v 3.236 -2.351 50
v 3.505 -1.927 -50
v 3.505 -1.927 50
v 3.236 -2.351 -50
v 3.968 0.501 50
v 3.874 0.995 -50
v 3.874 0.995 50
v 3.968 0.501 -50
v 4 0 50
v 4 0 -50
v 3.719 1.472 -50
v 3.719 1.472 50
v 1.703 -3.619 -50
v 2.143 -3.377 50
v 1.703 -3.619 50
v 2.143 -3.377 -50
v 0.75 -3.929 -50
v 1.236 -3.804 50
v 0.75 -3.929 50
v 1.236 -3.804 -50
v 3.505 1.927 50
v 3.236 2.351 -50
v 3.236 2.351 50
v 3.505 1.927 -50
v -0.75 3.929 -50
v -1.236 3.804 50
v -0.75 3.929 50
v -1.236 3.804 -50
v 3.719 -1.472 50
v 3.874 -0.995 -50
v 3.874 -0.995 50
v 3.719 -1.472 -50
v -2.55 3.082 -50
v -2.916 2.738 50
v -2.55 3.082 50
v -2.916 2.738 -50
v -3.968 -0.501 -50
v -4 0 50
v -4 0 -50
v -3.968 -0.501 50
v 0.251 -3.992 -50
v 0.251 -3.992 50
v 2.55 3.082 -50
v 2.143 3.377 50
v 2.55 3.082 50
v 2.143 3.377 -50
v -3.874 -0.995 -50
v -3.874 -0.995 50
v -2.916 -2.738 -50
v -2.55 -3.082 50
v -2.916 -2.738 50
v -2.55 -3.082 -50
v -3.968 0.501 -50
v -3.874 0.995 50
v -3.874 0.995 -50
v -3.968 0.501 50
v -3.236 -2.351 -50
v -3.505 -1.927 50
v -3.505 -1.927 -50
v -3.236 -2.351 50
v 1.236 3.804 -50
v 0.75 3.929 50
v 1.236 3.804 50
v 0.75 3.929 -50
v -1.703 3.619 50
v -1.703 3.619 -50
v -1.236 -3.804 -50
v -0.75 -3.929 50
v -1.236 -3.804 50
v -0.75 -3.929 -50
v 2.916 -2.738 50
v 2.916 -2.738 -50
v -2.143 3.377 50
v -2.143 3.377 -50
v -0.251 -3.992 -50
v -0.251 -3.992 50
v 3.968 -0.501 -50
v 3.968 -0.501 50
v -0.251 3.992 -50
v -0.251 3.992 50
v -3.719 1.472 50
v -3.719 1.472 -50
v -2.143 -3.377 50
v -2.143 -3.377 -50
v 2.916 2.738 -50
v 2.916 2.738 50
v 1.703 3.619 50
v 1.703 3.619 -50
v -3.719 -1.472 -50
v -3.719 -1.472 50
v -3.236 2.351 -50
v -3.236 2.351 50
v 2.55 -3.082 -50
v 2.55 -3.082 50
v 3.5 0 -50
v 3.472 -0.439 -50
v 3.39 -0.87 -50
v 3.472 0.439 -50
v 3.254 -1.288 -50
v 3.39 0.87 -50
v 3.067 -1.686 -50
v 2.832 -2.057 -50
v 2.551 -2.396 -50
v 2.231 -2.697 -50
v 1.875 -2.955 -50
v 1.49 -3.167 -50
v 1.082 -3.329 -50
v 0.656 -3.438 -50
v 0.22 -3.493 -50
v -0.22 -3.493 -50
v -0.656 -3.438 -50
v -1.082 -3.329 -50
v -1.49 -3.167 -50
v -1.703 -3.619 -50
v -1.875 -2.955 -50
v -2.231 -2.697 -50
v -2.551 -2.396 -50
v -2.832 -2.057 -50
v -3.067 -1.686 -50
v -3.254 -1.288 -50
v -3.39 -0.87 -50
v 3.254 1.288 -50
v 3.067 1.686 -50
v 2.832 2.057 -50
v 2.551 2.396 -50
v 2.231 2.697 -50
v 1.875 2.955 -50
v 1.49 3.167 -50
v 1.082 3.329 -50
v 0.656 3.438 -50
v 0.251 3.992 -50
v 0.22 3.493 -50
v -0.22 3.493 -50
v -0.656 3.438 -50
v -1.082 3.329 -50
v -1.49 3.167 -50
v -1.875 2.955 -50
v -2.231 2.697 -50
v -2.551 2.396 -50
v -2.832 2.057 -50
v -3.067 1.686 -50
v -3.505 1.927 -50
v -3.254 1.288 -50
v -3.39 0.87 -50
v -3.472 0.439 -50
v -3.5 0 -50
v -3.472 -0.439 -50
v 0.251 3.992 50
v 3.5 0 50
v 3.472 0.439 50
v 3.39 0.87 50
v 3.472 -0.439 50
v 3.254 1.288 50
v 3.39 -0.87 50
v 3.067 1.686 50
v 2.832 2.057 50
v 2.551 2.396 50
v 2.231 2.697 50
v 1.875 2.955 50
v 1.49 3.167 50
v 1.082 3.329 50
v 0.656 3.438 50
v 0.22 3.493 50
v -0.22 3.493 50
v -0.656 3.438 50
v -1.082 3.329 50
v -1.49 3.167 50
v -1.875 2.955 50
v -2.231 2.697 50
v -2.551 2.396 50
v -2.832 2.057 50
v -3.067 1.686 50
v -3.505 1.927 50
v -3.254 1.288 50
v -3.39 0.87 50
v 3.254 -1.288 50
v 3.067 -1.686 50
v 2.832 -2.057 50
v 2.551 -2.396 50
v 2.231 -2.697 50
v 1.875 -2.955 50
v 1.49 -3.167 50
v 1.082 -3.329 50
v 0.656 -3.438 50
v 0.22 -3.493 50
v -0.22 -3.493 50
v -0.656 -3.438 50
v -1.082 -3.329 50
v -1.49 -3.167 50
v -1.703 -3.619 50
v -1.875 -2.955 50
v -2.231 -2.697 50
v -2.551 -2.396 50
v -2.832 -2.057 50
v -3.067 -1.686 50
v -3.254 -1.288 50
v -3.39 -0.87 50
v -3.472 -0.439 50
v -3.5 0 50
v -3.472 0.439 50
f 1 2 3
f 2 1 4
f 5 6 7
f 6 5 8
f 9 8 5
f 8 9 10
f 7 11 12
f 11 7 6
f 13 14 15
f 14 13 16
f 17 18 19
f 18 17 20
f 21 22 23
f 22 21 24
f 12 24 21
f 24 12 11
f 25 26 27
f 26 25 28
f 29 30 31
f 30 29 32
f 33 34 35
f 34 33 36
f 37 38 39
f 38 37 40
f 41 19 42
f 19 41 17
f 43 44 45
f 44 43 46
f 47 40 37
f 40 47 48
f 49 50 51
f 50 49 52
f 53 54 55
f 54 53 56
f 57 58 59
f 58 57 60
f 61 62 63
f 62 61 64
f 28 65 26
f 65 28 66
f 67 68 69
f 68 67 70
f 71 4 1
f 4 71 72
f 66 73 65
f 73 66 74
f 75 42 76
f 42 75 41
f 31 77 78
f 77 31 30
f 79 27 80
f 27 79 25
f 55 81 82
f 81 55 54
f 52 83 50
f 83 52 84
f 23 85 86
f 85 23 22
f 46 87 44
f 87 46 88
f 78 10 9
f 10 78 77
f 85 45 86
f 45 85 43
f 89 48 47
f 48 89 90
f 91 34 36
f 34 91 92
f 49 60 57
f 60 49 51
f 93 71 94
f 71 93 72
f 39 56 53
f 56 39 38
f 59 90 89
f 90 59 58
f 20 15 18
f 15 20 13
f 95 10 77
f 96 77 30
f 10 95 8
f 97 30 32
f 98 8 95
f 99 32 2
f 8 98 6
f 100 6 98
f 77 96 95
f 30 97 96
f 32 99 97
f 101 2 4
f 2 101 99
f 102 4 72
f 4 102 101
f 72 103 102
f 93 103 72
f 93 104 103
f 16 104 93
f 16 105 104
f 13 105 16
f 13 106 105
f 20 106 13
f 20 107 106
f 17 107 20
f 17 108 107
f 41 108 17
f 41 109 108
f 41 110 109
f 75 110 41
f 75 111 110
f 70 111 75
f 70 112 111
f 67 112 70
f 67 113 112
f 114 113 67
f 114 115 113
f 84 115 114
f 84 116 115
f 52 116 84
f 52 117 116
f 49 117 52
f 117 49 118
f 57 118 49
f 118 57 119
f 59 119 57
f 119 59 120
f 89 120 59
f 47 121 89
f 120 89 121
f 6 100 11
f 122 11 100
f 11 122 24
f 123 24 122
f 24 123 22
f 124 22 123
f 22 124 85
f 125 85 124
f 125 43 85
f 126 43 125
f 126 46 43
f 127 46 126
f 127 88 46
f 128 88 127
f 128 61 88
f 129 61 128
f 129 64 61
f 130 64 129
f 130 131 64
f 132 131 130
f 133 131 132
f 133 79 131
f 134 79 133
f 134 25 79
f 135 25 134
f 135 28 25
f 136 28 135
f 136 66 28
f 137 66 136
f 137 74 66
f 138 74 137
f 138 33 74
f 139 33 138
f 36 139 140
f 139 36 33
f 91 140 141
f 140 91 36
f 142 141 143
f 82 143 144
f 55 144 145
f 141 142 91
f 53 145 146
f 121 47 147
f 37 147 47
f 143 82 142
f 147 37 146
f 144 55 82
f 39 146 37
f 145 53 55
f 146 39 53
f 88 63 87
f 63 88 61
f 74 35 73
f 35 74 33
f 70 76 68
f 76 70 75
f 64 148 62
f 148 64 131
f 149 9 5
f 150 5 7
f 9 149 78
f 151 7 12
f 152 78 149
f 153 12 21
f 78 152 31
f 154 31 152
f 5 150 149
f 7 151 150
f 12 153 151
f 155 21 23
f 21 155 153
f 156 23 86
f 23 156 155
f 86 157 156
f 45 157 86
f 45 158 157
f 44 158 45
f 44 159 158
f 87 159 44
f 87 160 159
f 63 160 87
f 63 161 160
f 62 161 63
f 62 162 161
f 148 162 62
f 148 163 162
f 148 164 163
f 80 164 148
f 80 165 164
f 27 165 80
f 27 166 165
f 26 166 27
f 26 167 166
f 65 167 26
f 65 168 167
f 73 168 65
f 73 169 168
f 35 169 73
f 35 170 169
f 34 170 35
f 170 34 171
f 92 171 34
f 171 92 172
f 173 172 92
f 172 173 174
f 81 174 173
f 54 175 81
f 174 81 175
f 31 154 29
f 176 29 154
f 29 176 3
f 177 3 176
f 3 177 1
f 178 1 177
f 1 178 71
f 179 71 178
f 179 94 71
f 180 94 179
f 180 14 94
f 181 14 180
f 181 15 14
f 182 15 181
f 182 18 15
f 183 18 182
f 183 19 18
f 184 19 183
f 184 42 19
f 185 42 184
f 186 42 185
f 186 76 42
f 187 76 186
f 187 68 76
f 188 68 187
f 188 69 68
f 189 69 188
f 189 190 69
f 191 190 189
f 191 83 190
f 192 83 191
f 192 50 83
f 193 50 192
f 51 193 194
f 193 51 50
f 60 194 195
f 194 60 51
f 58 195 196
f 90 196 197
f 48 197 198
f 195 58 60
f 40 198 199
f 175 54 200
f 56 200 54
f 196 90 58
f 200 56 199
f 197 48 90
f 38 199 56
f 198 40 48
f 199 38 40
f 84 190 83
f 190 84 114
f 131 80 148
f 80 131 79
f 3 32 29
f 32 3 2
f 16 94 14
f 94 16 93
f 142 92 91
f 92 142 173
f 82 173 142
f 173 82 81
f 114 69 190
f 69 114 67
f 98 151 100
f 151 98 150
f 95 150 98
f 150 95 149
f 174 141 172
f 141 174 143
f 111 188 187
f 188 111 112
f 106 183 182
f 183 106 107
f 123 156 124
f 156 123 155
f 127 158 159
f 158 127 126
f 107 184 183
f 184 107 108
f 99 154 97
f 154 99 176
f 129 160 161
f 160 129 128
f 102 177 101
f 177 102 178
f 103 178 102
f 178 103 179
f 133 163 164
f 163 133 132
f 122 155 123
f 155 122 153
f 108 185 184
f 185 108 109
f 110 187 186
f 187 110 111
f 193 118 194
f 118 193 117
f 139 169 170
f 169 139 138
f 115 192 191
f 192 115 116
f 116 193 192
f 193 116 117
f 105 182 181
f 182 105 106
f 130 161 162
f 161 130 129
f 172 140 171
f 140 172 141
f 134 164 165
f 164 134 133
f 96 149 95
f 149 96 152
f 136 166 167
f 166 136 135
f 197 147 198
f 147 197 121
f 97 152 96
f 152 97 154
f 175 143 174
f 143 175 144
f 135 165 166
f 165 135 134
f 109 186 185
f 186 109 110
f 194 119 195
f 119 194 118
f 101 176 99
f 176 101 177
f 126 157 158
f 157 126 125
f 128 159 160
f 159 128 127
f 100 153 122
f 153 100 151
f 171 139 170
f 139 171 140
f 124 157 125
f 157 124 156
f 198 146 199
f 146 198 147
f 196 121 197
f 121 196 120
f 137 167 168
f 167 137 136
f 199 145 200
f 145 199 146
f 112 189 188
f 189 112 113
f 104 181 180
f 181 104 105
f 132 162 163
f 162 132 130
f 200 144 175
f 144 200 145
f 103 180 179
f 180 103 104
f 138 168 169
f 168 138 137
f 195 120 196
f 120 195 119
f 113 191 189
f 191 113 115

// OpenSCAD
$fn = 50;


difference() {
	union() {
		translate(v = [0, 0, -50.0000000000]) {
			cylinder(h = 100, r = 4.0000000000);
		}
	}
	union() {
		translate(v = [0, 0, -100.0000000000]) {
			cylinder(h = 200, r = 3.5000000000);
		}
	}
}
